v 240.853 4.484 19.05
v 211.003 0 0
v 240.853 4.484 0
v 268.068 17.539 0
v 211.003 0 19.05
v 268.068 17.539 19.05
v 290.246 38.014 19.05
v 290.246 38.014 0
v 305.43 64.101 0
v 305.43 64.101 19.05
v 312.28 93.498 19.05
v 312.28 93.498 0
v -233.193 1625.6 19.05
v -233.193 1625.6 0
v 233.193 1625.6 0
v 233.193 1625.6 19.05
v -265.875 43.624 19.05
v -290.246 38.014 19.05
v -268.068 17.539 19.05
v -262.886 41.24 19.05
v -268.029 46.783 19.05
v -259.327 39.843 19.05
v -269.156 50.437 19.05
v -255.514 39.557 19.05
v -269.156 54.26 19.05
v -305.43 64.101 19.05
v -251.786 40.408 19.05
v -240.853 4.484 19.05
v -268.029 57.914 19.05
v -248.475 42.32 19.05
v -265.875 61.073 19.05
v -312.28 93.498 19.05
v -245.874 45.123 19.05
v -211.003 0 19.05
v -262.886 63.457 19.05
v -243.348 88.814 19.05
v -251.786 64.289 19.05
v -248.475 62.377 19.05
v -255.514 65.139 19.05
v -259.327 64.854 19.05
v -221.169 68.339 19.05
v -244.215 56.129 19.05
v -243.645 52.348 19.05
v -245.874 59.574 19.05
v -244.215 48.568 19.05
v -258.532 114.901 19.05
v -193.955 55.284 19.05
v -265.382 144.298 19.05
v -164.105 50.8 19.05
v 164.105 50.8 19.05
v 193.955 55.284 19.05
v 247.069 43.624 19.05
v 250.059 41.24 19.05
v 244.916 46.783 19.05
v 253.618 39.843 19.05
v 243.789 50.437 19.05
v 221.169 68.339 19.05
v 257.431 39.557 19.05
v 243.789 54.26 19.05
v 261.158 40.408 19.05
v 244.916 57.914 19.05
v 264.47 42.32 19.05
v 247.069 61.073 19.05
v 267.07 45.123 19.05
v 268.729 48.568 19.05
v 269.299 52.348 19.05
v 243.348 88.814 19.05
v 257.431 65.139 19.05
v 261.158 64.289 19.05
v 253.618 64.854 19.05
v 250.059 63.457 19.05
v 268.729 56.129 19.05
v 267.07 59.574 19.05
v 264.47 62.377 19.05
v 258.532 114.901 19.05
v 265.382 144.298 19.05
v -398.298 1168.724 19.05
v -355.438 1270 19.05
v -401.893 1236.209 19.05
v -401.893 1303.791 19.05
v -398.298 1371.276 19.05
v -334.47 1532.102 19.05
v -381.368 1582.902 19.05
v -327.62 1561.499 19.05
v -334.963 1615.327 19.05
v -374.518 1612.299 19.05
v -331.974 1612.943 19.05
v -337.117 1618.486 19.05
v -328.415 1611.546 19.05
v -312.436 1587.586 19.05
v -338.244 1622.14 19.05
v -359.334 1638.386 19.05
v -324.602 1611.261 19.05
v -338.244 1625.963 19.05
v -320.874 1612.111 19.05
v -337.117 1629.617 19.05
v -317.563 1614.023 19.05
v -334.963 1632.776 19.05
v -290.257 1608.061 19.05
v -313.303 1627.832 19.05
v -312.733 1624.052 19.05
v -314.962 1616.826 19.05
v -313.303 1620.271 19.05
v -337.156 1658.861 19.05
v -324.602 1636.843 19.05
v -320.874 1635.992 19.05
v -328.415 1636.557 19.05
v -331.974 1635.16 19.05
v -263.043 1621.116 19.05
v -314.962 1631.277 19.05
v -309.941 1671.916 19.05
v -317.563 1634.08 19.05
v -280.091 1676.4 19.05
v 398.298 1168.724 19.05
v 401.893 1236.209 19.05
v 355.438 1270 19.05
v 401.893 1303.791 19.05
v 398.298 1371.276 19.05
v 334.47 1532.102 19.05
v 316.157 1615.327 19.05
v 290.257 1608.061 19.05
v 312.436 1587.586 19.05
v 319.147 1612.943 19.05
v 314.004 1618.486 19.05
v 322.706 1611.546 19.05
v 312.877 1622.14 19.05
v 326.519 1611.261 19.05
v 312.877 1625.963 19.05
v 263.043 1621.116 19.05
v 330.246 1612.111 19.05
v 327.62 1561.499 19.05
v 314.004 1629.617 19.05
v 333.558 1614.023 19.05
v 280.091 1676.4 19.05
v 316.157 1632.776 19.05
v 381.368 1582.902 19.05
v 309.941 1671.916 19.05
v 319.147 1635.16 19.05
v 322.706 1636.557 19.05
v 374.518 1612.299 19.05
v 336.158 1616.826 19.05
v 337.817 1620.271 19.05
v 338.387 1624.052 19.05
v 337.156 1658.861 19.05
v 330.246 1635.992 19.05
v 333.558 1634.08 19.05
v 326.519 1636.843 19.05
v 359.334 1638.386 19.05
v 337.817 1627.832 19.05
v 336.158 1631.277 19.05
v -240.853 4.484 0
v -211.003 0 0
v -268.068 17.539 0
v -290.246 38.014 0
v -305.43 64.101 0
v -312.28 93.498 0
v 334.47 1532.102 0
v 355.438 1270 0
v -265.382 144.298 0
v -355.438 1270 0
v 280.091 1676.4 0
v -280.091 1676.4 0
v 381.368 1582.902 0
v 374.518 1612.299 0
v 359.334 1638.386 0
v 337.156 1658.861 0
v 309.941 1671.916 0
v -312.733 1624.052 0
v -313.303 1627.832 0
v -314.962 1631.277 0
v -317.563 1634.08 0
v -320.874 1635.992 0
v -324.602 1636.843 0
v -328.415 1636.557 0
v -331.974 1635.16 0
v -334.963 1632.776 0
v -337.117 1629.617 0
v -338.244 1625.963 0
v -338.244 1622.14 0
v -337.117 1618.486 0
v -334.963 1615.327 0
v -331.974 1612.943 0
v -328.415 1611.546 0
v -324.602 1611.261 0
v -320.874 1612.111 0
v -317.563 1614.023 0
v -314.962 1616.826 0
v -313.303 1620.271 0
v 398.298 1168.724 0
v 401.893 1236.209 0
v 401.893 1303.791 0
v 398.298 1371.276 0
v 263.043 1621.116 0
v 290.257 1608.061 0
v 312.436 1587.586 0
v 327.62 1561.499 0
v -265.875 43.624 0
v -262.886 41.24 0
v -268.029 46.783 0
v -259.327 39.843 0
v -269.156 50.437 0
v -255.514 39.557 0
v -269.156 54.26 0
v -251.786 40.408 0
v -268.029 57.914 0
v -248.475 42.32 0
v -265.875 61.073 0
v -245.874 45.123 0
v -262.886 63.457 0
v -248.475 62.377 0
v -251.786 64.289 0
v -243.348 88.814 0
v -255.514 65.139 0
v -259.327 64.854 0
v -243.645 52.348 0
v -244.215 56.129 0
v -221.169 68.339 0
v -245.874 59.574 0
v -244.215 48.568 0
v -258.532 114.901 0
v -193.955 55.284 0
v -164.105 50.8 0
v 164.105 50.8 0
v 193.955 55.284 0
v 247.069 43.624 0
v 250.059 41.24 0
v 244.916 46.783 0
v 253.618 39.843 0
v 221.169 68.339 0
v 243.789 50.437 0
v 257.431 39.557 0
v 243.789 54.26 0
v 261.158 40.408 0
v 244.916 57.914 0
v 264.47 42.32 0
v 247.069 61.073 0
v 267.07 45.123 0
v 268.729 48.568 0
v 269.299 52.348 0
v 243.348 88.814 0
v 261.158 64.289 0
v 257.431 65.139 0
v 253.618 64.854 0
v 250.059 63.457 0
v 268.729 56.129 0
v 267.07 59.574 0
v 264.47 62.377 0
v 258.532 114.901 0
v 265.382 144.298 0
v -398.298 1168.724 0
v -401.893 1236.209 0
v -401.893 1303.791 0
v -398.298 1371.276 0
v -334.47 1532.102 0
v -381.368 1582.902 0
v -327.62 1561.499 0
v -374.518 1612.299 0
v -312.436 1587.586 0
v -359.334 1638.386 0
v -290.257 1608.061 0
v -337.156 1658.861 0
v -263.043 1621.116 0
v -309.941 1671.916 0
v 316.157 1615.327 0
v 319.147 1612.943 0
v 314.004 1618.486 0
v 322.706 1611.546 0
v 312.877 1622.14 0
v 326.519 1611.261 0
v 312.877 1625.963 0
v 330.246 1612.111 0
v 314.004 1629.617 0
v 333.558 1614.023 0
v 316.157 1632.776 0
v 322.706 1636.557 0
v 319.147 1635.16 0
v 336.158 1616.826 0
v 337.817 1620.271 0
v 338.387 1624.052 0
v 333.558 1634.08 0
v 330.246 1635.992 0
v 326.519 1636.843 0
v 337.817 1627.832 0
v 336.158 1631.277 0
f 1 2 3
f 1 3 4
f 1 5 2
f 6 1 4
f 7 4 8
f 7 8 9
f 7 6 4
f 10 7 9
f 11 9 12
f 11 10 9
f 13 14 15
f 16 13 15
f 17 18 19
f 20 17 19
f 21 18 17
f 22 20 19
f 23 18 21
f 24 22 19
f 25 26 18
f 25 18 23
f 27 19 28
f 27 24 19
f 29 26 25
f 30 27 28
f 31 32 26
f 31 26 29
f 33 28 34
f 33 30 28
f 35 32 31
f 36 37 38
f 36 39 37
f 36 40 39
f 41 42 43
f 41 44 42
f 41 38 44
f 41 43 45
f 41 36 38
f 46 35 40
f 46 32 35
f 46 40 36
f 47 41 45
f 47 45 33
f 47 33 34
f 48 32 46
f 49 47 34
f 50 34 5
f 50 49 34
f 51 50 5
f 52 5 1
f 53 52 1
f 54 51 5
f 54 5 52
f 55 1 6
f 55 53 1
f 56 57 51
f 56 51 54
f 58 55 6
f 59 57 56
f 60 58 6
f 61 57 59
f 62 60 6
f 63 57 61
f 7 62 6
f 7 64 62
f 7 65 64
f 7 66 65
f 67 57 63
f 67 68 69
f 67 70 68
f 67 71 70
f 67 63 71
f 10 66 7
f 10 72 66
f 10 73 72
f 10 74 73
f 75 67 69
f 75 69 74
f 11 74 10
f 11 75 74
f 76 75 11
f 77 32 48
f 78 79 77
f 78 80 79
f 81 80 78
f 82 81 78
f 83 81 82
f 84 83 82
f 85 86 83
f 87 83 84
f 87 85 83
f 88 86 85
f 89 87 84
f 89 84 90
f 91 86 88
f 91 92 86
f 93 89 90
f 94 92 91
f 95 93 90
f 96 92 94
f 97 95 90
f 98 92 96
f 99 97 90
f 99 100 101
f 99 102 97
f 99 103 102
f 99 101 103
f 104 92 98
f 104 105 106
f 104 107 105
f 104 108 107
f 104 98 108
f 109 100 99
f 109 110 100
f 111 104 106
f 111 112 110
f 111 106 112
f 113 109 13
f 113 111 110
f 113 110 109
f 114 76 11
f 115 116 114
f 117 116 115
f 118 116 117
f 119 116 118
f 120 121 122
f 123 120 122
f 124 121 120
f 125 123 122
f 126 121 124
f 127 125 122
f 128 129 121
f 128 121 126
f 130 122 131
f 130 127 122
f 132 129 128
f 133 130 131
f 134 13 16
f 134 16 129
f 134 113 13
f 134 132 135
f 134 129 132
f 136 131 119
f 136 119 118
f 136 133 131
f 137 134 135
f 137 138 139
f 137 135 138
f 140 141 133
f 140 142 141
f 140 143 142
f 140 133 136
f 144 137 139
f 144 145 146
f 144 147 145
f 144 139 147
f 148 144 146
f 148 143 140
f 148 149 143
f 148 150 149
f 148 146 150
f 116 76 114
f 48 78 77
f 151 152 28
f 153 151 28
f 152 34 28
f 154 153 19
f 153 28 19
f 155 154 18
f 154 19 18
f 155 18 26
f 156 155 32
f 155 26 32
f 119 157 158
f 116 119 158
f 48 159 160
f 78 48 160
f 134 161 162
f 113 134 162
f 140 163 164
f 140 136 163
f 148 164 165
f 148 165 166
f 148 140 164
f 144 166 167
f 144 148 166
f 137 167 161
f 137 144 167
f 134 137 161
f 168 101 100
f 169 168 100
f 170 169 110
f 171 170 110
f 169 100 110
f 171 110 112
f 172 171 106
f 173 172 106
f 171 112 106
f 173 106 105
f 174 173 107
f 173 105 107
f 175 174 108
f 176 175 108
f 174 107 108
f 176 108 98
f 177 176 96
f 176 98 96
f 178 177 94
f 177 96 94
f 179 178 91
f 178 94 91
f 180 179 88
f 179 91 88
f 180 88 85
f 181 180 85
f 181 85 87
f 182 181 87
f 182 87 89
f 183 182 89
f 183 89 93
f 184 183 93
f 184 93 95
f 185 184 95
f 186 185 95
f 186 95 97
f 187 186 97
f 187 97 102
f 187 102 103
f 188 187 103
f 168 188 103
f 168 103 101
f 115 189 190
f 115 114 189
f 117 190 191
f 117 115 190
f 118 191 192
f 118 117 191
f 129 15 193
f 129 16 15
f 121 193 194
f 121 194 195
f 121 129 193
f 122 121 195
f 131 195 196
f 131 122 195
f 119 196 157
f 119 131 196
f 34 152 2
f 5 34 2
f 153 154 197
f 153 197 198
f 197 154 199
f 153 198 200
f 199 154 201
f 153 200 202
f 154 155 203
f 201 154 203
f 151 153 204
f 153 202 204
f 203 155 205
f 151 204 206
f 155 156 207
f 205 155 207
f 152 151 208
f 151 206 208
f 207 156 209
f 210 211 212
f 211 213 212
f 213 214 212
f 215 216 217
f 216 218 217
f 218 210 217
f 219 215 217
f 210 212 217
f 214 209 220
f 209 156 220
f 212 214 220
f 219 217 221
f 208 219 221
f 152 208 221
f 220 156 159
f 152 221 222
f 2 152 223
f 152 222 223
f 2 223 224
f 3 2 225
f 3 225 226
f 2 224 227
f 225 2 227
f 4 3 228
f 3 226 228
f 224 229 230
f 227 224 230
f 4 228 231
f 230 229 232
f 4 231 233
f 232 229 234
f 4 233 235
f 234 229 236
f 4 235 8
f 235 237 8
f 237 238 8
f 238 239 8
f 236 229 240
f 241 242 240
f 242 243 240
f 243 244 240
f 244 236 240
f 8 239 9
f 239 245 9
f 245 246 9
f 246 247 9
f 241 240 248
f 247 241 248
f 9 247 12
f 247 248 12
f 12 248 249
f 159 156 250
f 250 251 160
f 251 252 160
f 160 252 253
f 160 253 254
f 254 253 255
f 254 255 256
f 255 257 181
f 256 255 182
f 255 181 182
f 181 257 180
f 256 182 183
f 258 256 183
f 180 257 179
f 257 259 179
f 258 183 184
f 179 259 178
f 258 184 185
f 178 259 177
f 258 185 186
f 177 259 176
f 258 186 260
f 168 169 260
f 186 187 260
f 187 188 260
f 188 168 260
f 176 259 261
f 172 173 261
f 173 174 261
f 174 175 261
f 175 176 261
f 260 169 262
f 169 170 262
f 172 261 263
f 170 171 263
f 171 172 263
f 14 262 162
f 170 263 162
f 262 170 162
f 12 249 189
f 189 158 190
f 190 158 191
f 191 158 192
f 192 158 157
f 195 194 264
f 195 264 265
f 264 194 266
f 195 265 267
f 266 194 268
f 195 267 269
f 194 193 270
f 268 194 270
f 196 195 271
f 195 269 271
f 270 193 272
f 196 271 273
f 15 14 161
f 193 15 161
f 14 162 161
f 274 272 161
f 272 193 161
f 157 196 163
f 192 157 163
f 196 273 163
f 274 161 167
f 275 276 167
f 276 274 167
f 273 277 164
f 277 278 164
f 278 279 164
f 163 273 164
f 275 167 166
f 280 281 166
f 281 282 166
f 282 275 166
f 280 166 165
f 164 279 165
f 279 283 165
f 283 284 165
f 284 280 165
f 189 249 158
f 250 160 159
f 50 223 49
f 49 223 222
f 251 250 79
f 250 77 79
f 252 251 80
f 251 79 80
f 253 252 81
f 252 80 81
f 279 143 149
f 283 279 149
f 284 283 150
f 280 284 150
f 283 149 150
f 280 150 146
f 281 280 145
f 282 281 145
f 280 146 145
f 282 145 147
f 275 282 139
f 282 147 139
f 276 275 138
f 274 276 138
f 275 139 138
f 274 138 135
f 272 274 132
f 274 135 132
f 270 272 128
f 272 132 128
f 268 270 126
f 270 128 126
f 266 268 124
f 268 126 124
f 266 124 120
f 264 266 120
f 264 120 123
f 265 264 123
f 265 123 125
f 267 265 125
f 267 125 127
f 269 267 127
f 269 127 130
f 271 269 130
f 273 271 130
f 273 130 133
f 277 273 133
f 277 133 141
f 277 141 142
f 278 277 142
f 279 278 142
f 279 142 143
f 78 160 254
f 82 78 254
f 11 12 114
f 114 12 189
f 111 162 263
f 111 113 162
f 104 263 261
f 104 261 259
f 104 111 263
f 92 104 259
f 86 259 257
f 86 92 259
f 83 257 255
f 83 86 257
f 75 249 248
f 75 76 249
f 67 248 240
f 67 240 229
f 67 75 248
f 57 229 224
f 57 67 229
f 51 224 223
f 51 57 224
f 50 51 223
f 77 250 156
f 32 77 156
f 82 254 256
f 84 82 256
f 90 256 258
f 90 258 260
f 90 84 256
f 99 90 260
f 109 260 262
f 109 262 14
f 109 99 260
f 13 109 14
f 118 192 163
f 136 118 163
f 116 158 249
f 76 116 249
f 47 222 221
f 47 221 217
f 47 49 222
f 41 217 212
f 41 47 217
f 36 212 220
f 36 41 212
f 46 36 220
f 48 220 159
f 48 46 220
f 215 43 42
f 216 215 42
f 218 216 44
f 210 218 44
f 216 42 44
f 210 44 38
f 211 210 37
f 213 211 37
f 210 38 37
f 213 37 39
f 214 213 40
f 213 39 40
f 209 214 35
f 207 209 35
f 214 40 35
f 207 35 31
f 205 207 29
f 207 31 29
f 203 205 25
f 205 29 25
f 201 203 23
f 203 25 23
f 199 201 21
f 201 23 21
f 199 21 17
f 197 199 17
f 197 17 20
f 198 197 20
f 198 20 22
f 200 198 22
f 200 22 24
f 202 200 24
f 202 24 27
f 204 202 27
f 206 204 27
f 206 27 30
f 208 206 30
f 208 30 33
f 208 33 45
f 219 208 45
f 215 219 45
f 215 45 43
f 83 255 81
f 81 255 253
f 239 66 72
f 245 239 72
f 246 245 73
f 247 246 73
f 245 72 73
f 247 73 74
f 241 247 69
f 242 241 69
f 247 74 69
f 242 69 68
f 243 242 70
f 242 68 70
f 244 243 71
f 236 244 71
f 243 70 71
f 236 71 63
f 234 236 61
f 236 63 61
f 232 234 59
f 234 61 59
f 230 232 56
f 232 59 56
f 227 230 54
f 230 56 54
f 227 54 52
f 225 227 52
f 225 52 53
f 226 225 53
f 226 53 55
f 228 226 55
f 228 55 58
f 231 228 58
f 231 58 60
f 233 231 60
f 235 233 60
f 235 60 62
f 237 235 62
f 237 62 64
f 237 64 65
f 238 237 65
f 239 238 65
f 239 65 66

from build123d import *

# Parameters (mm, degrees)
F1_DEPTH = 19.05
F2_R     = 101.6
F3_R     = 1270
F4_R     = 12.827
F5_DEPTH = 19.051


# Not quite as in the source:
# - a feature names something its author has since deleted; it is built from what else it names


with BuildPart() as f1:
    # F0 (on Top) → F1 (new body)
    with BuildSketch(Plane.XY):
        Polygon((-304.8, 0), (0, 0), (304.8, 0), (406.4, 1270), (373.888, 1676.4), (0, 1676.4), (-373.888, 1676.4), (-406.4, 1270), align=None)
        Polygon((-326.989699267, 1625.6), (0, 1625.6), (326.989699267, 1625.6), (355.437699267, 1270), (257.901699267, 50.8), (0, 50.8), (-257.901699267, 50.8), (-355.437699267, 1270), align=None, mode=Mode.SUBTRACT)
    extrude(amount=F1_DEPTH)

    # F2
    f2_edges = [f1.edges().sort_by_distance(p)[0] for p in [
        (-304.8, 0, 9.525),
        (304.8, 0, 9.525),
        (373.888, 1676.4, 9.525),
        (-373.888, 1676.4, 9.525),
        (-326.989699, 1625.6, 9.525),
        (326.989699, 1625.6, 9.525),
        (-257.901699, 50.8, 9.525),
        (257.901699, 50.8, 9.525),
    ]]
    fillet(f2_edges, radius=F2_R)

    # F3
    f3_edges = [f1.edges().sort_by_distance(p)[0] for p in [
        (-406.4, 1270, 9.525),
        (406.4, 1270, 9.525),
    ]]
    fillet(f3_edges, radius=F3_R)

    # F4 (on face) → F5 (cut, through all)
    with BuildSketch(Plane.XY.offset(19.05)):
        with Locations((256.4722616265, 52.3483595568)):
            Circle(F4_R)
        with Locations((-256.4722616265, 52.3483595568)):
            Circle(F4_R)
        with Locations((-325.5602616265, 1624.0516404432)):
            Circle(F4_R)
        with Locations((325.5602616265, 1624.0516404432)):
            Circle(F4_R)
    extrude(amount=-F5_DEPTH, mode=Mode.SUBTRACT)


solid = f1.part
